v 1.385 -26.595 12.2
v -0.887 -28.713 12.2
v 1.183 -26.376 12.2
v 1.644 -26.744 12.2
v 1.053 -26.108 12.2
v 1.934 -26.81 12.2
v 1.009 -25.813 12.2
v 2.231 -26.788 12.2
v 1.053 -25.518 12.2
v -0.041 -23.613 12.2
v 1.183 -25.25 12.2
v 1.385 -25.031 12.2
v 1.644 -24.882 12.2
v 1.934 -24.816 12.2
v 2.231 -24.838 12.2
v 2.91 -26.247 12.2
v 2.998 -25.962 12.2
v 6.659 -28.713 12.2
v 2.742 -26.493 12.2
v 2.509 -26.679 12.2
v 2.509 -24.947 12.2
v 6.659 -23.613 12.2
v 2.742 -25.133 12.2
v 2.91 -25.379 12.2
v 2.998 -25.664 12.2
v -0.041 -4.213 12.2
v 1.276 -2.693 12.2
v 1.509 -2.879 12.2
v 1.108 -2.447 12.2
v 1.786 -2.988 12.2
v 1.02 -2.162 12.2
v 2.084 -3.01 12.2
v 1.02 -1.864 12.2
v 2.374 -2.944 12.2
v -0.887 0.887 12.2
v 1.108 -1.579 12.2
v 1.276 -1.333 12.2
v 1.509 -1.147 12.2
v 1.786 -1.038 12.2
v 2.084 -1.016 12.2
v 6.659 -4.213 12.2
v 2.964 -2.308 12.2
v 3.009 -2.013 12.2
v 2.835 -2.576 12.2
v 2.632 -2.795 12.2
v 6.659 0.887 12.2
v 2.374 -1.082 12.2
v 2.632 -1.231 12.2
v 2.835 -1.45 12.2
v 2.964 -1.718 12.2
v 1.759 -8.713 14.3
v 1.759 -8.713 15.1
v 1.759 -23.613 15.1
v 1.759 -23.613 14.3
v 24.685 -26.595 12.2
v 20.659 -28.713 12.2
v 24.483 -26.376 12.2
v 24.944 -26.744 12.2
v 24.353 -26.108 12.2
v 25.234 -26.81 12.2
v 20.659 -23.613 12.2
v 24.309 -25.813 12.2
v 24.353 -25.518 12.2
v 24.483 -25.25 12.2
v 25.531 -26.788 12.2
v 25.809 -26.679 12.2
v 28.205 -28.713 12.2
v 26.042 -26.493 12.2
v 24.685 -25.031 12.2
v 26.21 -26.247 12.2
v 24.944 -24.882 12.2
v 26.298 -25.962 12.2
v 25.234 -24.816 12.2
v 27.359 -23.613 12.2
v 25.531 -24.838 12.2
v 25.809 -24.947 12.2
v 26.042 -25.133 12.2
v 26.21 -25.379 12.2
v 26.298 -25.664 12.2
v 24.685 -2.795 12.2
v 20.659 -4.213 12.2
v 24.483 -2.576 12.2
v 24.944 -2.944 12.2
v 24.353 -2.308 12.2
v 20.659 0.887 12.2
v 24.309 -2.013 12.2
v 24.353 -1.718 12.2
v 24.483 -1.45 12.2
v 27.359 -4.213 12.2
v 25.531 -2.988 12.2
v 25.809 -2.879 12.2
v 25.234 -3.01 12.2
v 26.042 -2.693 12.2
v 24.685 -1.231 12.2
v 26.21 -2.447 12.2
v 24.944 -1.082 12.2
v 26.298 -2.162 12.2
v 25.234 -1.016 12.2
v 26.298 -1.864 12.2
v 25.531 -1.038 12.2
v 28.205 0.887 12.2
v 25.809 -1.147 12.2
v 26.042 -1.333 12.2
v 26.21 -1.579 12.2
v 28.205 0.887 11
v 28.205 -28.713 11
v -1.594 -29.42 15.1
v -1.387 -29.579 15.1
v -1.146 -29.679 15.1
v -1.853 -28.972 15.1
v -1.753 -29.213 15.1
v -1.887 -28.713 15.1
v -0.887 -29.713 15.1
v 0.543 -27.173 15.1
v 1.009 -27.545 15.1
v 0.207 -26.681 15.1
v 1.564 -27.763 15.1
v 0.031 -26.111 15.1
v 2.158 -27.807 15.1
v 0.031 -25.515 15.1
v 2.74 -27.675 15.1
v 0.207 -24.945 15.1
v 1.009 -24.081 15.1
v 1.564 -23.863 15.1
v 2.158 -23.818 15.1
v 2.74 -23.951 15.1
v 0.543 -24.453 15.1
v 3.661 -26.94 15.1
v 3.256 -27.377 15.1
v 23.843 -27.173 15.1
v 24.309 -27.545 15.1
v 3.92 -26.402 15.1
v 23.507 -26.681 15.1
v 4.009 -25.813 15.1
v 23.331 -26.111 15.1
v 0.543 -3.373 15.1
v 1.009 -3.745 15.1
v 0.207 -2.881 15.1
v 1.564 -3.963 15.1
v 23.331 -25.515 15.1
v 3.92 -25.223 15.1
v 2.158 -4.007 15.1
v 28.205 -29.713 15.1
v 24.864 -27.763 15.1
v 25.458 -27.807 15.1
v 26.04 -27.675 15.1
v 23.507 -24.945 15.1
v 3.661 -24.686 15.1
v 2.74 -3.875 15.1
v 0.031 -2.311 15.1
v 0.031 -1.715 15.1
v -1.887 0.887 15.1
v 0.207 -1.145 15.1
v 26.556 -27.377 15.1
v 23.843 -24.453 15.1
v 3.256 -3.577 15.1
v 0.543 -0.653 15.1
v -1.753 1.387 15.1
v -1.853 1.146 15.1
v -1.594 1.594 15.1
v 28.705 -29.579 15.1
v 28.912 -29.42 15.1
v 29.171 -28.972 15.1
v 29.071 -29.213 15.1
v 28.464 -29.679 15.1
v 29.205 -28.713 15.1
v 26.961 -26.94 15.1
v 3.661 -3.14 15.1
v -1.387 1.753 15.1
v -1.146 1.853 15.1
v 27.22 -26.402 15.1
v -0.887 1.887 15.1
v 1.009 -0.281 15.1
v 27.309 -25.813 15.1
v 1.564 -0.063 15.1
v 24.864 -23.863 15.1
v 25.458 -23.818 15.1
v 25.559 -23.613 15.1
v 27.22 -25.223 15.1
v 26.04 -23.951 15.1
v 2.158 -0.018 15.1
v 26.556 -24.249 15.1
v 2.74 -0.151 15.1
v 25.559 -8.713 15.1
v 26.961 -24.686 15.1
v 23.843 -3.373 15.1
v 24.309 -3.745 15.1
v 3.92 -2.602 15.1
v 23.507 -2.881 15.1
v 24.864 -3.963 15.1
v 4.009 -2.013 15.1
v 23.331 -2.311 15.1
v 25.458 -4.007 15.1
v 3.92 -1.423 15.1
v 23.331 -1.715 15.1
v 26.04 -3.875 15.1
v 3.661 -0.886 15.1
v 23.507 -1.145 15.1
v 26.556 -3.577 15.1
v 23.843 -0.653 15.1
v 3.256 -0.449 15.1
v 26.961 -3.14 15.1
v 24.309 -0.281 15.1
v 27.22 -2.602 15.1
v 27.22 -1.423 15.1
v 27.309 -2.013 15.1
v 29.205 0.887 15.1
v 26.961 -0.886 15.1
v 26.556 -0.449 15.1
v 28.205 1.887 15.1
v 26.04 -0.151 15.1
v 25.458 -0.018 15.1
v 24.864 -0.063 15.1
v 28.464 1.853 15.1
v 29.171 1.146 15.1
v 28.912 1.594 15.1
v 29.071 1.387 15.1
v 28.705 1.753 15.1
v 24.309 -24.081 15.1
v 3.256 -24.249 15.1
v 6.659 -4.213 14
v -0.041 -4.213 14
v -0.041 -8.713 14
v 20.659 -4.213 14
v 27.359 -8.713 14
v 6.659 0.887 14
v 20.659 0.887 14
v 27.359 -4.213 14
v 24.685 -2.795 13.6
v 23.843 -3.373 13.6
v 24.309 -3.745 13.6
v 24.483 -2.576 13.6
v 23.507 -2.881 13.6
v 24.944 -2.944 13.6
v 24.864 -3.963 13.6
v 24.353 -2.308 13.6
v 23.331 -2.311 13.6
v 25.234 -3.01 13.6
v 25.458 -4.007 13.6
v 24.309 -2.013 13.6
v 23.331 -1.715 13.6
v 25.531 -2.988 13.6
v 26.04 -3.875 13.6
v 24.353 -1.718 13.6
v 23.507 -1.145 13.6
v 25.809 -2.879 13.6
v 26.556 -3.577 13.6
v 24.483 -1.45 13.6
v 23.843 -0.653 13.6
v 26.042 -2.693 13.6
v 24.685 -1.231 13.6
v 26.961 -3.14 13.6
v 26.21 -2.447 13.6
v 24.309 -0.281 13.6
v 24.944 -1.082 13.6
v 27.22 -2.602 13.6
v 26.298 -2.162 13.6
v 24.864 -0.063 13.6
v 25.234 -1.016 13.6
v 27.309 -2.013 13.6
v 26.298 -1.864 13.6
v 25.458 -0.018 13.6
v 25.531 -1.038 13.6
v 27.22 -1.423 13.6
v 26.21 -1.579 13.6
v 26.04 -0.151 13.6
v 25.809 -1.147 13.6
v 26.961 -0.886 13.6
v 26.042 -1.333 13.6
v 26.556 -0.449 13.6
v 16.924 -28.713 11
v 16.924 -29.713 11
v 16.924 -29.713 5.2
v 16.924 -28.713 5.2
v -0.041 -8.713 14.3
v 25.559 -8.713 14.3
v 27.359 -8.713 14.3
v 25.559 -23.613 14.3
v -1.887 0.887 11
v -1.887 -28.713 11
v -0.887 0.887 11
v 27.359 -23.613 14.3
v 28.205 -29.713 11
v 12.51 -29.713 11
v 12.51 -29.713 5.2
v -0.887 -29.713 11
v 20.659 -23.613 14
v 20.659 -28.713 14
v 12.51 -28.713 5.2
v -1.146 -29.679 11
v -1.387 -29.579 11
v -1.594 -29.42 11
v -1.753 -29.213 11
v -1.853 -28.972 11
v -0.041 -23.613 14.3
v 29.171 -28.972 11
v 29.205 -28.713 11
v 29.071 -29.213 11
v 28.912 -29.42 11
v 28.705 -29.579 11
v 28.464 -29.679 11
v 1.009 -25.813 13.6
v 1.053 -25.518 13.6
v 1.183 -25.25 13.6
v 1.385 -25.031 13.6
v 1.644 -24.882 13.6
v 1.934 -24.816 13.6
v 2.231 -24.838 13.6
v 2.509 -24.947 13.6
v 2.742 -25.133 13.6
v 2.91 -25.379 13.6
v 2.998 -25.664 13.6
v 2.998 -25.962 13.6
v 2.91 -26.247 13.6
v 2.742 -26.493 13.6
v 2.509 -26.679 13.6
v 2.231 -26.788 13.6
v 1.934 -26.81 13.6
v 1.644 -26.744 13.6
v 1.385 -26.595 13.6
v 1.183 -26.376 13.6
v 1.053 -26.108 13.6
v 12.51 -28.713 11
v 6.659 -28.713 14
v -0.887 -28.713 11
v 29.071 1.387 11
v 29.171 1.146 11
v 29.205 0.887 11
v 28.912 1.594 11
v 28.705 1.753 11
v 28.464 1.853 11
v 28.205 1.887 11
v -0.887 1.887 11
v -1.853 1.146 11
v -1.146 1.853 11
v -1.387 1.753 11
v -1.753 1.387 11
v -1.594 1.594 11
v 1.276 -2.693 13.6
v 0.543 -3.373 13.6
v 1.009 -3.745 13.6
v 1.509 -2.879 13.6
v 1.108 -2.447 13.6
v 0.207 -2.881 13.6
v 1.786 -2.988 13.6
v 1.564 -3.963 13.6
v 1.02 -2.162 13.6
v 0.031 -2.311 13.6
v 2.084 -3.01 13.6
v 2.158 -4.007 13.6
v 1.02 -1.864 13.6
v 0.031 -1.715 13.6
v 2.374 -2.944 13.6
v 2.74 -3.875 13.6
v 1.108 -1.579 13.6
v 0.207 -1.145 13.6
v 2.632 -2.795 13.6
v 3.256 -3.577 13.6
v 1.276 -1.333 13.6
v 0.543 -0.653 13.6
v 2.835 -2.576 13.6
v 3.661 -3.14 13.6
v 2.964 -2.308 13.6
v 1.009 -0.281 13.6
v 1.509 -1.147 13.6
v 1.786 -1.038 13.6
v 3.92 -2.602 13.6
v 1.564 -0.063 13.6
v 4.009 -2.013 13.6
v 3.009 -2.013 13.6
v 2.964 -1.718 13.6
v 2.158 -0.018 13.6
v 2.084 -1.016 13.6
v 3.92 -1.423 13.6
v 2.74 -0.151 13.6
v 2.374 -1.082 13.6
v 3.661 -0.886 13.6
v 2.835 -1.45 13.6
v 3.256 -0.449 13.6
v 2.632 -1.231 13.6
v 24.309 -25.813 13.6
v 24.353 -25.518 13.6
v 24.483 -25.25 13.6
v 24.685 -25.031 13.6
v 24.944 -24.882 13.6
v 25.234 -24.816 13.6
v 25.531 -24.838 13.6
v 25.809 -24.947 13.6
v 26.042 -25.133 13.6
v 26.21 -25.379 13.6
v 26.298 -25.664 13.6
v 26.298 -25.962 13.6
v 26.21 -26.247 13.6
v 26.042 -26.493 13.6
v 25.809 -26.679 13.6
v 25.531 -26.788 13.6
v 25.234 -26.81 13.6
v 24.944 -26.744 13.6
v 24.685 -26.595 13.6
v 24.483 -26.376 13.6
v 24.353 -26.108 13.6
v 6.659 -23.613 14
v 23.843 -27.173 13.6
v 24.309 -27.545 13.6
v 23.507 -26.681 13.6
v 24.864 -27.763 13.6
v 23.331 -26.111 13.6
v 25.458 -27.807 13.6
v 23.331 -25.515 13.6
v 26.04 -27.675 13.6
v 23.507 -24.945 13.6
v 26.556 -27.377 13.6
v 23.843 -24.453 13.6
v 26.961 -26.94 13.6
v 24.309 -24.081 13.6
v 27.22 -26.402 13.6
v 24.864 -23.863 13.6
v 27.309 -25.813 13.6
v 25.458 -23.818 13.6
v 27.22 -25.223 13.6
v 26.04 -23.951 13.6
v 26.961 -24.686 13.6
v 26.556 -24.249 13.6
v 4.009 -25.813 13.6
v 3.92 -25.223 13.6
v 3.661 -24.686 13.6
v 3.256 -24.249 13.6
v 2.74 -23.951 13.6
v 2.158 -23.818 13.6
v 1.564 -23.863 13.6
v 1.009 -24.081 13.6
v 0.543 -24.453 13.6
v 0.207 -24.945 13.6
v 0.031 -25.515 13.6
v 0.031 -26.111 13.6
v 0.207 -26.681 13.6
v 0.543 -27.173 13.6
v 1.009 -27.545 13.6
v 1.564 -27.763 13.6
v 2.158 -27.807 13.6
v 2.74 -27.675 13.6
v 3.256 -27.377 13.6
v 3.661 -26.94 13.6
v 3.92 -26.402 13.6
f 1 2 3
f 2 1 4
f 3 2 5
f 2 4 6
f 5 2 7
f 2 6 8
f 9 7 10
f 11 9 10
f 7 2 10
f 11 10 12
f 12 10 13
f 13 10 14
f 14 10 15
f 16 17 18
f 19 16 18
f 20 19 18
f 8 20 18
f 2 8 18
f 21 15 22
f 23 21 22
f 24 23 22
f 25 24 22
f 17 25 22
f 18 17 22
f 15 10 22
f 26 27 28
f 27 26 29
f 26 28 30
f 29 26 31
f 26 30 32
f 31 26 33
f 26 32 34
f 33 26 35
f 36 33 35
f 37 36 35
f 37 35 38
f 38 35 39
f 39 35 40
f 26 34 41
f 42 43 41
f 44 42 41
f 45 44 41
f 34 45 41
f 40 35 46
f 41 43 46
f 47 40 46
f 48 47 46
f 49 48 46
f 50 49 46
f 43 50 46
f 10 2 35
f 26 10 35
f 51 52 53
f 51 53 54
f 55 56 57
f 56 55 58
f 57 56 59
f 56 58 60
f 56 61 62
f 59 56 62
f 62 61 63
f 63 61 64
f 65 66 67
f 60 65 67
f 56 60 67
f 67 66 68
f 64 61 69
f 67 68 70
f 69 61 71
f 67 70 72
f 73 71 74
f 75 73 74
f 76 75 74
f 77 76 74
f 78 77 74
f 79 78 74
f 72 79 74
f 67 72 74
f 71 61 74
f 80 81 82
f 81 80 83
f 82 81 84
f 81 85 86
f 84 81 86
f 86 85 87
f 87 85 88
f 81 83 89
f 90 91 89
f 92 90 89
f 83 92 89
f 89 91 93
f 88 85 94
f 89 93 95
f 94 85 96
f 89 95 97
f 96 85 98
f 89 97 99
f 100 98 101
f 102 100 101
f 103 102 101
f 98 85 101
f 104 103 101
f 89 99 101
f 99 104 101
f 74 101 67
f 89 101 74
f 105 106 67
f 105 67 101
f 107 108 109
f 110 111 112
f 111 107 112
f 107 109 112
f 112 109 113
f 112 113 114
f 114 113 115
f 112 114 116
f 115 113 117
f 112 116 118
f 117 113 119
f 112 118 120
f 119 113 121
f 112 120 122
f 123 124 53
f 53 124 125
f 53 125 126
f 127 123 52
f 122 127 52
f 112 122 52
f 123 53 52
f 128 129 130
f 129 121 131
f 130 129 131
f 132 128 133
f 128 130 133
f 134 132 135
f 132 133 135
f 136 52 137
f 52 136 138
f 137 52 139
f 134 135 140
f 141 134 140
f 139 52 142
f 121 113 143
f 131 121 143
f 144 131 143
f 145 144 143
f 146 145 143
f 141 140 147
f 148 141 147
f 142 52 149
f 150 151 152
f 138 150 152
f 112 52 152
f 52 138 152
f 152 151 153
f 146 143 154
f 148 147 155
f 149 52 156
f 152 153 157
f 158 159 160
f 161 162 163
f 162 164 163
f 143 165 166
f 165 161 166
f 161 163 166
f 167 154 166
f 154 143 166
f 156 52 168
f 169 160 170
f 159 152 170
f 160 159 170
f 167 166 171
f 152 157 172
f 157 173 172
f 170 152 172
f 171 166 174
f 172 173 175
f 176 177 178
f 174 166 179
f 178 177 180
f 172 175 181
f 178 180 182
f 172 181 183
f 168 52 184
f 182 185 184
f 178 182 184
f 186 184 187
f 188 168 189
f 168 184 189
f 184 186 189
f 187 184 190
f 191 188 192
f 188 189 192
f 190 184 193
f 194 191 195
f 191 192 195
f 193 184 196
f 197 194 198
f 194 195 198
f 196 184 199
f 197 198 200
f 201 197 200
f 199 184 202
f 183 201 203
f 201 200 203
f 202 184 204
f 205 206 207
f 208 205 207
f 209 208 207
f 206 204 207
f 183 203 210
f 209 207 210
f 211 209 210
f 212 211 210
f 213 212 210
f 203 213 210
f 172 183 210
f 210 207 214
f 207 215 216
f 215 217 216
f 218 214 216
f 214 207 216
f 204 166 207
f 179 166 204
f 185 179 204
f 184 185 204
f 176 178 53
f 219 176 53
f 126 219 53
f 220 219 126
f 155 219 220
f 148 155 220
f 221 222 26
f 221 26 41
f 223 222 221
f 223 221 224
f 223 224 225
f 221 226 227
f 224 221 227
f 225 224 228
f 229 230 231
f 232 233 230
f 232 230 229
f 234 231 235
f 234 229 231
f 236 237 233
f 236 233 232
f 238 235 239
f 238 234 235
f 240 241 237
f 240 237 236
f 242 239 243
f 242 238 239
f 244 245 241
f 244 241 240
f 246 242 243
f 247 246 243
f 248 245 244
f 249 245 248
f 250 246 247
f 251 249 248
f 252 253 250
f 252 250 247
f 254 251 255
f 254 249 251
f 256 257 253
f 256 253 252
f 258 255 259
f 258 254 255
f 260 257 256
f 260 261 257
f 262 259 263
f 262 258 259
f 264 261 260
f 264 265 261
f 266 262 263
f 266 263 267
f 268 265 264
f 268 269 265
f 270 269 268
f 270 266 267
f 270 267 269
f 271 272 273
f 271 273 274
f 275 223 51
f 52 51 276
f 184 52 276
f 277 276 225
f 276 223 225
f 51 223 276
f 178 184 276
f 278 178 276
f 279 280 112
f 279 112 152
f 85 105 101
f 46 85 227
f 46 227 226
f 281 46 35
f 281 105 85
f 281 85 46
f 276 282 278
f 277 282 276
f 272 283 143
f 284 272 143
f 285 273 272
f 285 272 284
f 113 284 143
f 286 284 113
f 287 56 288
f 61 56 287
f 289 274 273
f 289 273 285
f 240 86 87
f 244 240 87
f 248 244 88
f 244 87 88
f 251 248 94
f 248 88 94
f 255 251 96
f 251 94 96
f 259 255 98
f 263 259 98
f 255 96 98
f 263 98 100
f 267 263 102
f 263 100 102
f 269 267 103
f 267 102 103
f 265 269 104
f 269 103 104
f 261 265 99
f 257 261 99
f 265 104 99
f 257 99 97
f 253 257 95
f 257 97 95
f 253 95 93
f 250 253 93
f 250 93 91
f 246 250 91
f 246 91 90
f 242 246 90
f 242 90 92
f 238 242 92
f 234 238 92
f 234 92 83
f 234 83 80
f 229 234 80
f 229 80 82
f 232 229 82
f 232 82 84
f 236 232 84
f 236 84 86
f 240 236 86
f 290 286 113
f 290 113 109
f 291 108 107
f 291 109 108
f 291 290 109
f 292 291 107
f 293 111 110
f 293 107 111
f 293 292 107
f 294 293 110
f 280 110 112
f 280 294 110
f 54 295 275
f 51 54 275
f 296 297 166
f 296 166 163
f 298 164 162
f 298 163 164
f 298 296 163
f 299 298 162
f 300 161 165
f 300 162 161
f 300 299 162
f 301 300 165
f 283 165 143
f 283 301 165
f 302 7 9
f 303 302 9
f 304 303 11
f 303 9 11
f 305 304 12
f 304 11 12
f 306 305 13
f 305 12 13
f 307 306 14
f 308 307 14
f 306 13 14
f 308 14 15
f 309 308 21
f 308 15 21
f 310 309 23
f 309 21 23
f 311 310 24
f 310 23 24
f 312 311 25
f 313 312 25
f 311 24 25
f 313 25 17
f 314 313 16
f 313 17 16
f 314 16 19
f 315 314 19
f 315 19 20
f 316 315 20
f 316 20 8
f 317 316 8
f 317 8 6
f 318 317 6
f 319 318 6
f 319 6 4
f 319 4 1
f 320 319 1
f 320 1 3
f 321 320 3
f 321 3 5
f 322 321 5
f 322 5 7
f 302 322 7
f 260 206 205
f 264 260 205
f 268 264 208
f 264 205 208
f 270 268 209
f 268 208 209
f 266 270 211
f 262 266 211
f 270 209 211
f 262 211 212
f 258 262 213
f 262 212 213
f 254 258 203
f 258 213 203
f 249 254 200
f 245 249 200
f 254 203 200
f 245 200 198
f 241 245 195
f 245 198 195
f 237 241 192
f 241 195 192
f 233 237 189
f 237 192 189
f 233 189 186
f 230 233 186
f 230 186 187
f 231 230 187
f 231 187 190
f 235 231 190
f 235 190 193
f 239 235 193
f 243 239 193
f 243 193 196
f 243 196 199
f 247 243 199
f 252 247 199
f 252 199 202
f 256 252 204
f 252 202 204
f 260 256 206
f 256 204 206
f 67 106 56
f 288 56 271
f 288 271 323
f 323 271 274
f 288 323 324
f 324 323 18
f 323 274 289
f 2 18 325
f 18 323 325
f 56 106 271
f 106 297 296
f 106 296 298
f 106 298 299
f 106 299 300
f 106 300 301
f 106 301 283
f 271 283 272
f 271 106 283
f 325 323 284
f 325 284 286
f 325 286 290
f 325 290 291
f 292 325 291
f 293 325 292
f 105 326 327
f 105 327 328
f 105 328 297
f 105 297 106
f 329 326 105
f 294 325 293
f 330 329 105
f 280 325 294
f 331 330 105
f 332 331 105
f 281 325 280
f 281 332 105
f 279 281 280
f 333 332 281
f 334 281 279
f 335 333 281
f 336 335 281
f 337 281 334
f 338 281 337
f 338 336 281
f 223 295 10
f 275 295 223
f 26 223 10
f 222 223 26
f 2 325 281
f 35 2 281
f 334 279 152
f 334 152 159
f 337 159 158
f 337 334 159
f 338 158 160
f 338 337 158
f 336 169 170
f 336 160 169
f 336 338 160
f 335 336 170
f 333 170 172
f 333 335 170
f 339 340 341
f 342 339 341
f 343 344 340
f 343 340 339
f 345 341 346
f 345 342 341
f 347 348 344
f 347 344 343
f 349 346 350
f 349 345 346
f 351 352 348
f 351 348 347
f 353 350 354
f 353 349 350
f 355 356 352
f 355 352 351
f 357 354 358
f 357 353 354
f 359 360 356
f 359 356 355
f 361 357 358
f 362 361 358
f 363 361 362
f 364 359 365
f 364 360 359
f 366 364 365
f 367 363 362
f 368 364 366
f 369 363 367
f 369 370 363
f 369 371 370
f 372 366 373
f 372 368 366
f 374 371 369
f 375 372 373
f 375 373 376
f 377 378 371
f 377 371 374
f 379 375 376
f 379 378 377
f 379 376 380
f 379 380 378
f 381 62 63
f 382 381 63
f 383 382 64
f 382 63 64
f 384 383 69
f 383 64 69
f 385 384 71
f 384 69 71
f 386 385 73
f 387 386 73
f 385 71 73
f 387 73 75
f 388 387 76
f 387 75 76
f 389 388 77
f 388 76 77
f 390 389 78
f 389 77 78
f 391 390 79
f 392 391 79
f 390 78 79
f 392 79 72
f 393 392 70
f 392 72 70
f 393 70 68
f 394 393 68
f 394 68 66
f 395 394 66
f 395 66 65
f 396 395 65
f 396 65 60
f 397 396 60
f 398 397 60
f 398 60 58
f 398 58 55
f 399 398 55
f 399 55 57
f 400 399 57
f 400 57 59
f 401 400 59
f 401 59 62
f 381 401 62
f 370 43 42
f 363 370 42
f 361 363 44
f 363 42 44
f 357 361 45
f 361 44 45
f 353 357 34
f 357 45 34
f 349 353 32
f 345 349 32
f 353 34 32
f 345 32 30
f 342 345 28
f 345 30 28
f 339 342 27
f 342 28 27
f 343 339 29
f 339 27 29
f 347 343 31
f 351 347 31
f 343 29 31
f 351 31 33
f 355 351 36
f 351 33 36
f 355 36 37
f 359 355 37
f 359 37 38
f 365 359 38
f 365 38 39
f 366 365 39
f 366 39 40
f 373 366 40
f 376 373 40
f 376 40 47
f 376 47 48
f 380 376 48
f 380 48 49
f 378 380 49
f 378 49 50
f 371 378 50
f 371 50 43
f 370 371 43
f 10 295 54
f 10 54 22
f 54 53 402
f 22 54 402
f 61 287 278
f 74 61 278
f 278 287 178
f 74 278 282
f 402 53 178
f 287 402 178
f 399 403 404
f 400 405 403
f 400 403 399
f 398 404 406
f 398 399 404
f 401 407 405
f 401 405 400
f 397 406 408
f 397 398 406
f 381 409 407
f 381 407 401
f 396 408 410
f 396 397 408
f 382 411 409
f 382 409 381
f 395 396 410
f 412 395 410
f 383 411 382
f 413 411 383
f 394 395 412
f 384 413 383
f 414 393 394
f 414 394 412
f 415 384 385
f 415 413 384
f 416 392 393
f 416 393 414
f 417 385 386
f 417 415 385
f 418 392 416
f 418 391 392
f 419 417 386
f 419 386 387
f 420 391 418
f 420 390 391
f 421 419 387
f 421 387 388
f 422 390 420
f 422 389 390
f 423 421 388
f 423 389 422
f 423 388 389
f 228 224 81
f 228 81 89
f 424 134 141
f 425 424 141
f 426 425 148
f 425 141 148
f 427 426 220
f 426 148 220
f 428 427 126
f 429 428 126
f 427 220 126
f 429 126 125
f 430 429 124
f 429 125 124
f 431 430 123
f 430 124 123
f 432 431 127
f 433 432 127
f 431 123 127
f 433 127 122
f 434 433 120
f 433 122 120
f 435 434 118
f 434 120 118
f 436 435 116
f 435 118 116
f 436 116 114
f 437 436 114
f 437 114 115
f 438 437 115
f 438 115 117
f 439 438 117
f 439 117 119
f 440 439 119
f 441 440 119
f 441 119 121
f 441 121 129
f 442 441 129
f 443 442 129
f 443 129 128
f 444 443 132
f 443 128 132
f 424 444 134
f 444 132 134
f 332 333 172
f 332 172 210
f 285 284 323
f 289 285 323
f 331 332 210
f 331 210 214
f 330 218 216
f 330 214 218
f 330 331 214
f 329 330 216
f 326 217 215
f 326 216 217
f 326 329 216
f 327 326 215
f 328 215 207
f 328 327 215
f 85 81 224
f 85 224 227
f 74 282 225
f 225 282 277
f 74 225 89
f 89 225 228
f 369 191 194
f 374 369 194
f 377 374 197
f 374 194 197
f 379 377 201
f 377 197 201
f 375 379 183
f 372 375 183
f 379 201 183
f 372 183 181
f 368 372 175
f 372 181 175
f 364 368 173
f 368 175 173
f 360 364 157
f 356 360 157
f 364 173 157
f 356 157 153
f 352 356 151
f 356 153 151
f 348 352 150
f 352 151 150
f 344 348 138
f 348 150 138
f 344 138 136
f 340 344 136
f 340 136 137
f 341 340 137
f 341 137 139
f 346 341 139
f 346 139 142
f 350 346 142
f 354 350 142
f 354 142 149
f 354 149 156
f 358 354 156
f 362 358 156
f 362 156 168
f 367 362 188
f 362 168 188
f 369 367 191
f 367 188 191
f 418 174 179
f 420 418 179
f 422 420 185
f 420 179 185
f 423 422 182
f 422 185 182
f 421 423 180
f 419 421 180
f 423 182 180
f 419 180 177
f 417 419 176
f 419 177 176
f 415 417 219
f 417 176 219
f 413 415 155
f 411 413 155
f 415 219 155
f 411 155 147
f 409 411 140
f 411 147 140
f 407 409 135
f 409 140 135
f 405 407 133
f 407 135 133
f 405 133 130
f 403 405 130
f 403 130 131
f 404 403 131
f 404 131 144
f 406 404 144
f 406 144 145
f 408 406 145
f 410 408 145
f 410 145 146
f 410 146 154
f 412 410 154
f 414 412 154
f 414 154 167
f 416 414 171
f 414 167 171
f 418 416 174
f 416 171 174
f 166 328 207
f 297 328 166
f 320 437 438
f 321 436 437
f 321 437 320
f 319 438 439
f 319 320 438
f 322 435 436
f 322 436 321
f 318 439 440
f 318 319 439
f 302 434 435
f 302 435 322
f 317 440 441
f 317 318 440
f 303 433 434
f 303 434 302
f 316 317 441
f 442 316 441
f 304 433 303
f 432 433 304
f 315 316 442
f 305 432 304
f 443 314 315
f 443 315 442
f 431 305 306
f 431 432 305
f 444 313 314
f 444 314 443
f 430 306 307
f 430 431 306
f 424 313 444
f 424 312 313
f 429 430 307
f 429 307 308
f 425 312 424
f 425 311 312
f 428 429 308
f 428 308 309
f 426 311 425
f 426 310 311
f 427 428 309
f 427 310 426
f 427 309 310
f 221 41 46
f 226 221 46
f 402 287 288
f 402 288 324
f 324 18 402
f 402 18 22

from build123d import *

# Parameters (mm, degrees)
EXTRUDE_1_DEPTH     = 2.9
CUT_EXTRUDE_1_REACH = 43.764
SKETCH_2_R          = 1
EXTRUDE_START       = 1.2
SKETCH_3_W          = 29.092354585
SKETCH_3_H          = 29.600355601
EXTRUDE_2_DEPTH     = 1.2
CUT_EXTRUDE_2_REACH = 43.864
SKETCH_4_W          = 27.4
SKETCH_4_H          = 19.4
SKETCH_5_W          = 14
SKETCH_5_H          = 5.100177801
SKETCH_5_H_2        = 5.1001778
CUT_EXTRUDE_3_DEPTH = 1.8
SKETCH_6_W          = 4.41346869
SKETCH_6_H          = 1
EXTRUDE_3_DEPTH     = 5.8
SKETCH_8_W          = 27.4
SKETCH_8_H          = 1.1
EXTRUDE_4_DEPTH     = 4.5
SKETCH_9_R          = 2
CUT_EXTRUDE_4_DEPTH = 1.5
SKETCH_10_W         = 0.8
SKETCH_10_H         = 14.9
EXTRUDE_5_DEPTH     = 1.8


with BuildPart() as part:
    # 草图1 → 凸台-拉伸1 (new body)
    with BuildSketch(Plane.XY.offset(12.2)):
        with BuildLine():
            Line((28.20505461, 1.887299975), (-0.887299975, 1.887299975))
            ThreePointArc((-0.887299975, 1.887299975), (-1.594406756, 1.594406756), (-1.887299975, 0.887299975))
            Line((-1.887299975, 0.887299975), (-1.887299975, -28.713055626))
            ThreePointArc((-1.887299975, -28.713055626), (-1.594406756, -29.420162407), (-0.887299975, -29.713055626))
            Line((-0.887299975, -29.713055626), (12.510283784, -29.713055626))
            Line((12.510283784, -29.713055626), (16.923752474, -29.713055626))
            Line((16.923752474, -29.713055626), (28.20505461, -29.713055626))
            ThreePointArc((28.20505461, -29.713055626), (28.912161391, -29.420162407), (29.20505461, -28.713055626))
            Line((29.20505461, -28.713055626), (29.20505461, 0.887299975))
            ThreePointArc((29.20505461, 0.887299975), (28.912161391, 1.594406756), (28.20505461, 1.887299975))
        make_face()
    extrude(amount=EXTRUDE_1_DEPTH)

    # 草图2 → 切除-拉伸1 (cut, up to next)
    with BuildSketch(Plane(origin=(0, 0, 12.2), x_dir=(-1, 0, 0), z_dir=(0, 0, -1)), mode=Mode.PRIVATE) as cut_extrude_1_sk1:
        with Locations((-25.308877318, -2.012877826)):
            Circle(SKETCH_2_R)
    cut_extrude_1_tool1 = extrude(cut_extrude_1_sk1.sketch, amount=-CUT_EXTRUDE_1_REACH, mode=Mode.PRIVATE) & part.part
    # 草图2 → 切除-拉伸1 (cut, up to next)
    with BuildSketch(Plane(origin=(0, 0, 12.2), x_dir=(-1, 0, 0), z_dir=(0, 0, -1)), mode=Mode.PRIVATE) as cut_extrude_1_sk2:
        with Locations((-25.308877318, -25.812877826)):
            Circle(SKETCH_2_R)
    cut_extrude_1_tool2 = extrude(cut_extrude_1_sk2.sketch, amount=-CUT_EXTRUDE_1_REACH, mode=Mode.PRIVATE) & part.part
    # 草图2 → 切除-拉伸1 (cut, up to next)
    with BuildSketch(Plane(origin=(0, 0, 12.2), x_dir=(-1, 0, 0), z_dir=(0, 0, -1)), mode=Mode.PRIVATE) as cut_extrude_1_sk3:
        with Locations((-2.008877318, -25.812877826)):
            Circle(SKETCH_2_R)
    cut_extrude_1_tool3 = extrude(cut_extrude_1_sk3.sketch, amount=-CUT_EXTRUDE_1_REACH, mode=Mode.PRIVATE) & part.part
    # 草图2 → 切除-拉伸1 (cut, up to next)
    with BuildSketch(Plane(origin=(0, 0, 12.2), x_dir=(-1, 0, 0), z_dir=(0, 0, -1)), mode=Mode.PRIVATE) as cut_extrude_1_sk4:
        with Locations(Location((-2.008877318, -2.012877826, 0), (0, 0, 180))):
            Circle(SKETCH_2_R)
    cut_extrude_1_tool4 = extrude(cut_extrude_1_sk4.sketch, amount=-CUT_EXTRUDE_1_REACH, mode=Mode.PRIVATE) & part.part
    add(cut_extrude_1_tool1.solids().sort_by_distance((25.308877, -2.012878, 12.2))[0], mode=Mode.SUBTRACT)
    add(cut_extrude_1_tool2.solids().sort_by_distance((25.308877, -25.812878, 12.2))[0], mode=Mode.SUBTRACT)
    add(cut_extrude_1_tool3.solids().sort_by_distance((2.008877, -25.812878, 12.2))[0], mode=Mode.SUBTRACT)
    add(cut_extrude_1_tool4.solids().sort_by_distance((2.008877, -2.012878, 12.2))[0], mode=Mode.SUBTRACT)

    # 草图3 → 凸台-拉伸2 (add)
    with BuildSketch(Plane(origin=(0, 0, 12.2), x_dir=(-1, 0, 0), z_dir=(0, 0, -1)).offset(EXTRUDE_START)):
        with BuildLine():
            Line((0.887299975, 1.887299975), (-28.20505461, 1.887299975))
            ThreePointArc((-28.20505461, 1.887299975), (-28.912161391, 1.594406756), (-29.20505461, 0.887299975))
            Line((-29.20505461, 0.887299975), (-29.20505461, -28.713055626))
            ThreePointArc((-29.20505461, -28.713055626), (-28.912161391, -29.420162407), (-28.20505461, -29.713055626))
            Line((-28.20505461, -29.713055626), (0.887299975, -29.713055626))
            ThreePointArc((0.887299975, -29.713055626), (1.594406756, -29.420162407), (1.887299975, -28.713055626))
            Line((1.887299975, -28.713055626), (1.887299975, 0.887299975))
            ThreePointArc((1.887299975, 0.887299975), (1.594406756, 1.594406756), (0.887299975, 1.887299975))
        make_face()
        with Locations((-13.658877318, -13.912877826)):
            Rectangle(SKETCH_3_W, SKETCH_3_H, mode=Mode.SUBTRACT)
    extrude(amount=-EXTRUDE_2_DEPTH)

    # 草图4 → 切除-拉伸2 (cut, up to next)
    with BuildSketch(Plane.XY.offset(15.1), mode=Mode.PRIVATE) as cut_extrude_2_sk1:
        with Locations((13.658877318, -13.912877826)):
            Rectangle(SKETCH_4_W, SKETCH_4_H)
    cut_extrude_2_tool1 = extrude(cut_extrude_2_sk1.sketch, amount=-CUT_EXTRUDE_2_REACH, mode=Mode.PRIVATE) & part.part
    add(cut_extrude_2_tool1.solids().sort_by_distance((13.658877, -13.912878, 15.1))[0], mode=Mode.SUBTRACT)

    # 草图5 → 切除-拉伸3 (cut)
    with BuildSketch(Plane(origin=(0, 0, 12.2), x_dir=(-1, 0, 0), z_dir=(0, 0, -1))):
        with Locations((-13.658877318, -1.662788926)):
            Rectangle(SKETCH_5_W, SKETCH_5_H)
        with Locations((-13.658877318, -26.162966726)):
            Rectangle(SKETCH_5_W, SKETCH_5_H_2)
    extrude(amount=-CUT_EXTRUDE_3_DEPTH, mode=Mode.SUBTRACT)

    # 草图6 → 凸台-拉伸3 (add)
    with BuildSketch(Plane(origin=(0, 0, 11), x_dir=(-1, 0, 0), z_dir=(0, 0, -1))):
        with Locations((-14.717018129, -29.213055626)):
            Rectangle(SKETCH_6_W, SKETCH_6_H)
    extrude(amount=EXTRUDE_3_DEPTH)

    # 草图8 → 凸台-拉伸4 (add)
    with BuildSketch(Plane(origin=(0, -4.212877826, 0), x_dir=(1, 0, 0), z_dir=(0, 1, 0))):
        with Locations((13.658877318, -14.55)):
            Rectangle(SKETCH_8_W, SKETCH_8_H)
    extrude(amount=-EXTRUDE_4_DEPTH)

    # 草图9 → 切除-拉伸4 (cut)
    with BuildSketch(Plane.XY.offset(15.1)):
        with Locations((25.308877318, -2.012877826)):
            Circle(SKETCH_9_R)
        with Locations((2.008877318, -2.012877826)):
            Circle(SKETCH_9_R)
        with Locations((2.008877318, -25.812877826)):
            Circle(SKETCH_9_R)
        with Locations((25.308877318, -25.812877826)):
            Circle(SKETCH_9_R)
    extrude(amount=-CUT_EXTRUDE_4_DEPTH, mode=Mode.SUBTRACT)

    # 草图10 → 凸台-拉伸5 (add)
    with BuildSketch(Plane(origin=(-0.041122682, 0, 0), x_dir=(0, 0, -1), z_dir=(1, 0, 0))):
        with Locations((-14.7, -16.162877826)):
            Rectangle(SKETCH_10_W, SKETCH_10_H)
    extrude_5 = extrude(amount=EXTRUDE_5_DEPTH)

    # 镜向1: 凸台-拉伸5 across plane
    add(extrude_5.mirror(Plane(origin=(13.658877318, 0, 0), x_dir=(0, 0, 1), z_dir=(1, 0, 0))))


solid = part.part
